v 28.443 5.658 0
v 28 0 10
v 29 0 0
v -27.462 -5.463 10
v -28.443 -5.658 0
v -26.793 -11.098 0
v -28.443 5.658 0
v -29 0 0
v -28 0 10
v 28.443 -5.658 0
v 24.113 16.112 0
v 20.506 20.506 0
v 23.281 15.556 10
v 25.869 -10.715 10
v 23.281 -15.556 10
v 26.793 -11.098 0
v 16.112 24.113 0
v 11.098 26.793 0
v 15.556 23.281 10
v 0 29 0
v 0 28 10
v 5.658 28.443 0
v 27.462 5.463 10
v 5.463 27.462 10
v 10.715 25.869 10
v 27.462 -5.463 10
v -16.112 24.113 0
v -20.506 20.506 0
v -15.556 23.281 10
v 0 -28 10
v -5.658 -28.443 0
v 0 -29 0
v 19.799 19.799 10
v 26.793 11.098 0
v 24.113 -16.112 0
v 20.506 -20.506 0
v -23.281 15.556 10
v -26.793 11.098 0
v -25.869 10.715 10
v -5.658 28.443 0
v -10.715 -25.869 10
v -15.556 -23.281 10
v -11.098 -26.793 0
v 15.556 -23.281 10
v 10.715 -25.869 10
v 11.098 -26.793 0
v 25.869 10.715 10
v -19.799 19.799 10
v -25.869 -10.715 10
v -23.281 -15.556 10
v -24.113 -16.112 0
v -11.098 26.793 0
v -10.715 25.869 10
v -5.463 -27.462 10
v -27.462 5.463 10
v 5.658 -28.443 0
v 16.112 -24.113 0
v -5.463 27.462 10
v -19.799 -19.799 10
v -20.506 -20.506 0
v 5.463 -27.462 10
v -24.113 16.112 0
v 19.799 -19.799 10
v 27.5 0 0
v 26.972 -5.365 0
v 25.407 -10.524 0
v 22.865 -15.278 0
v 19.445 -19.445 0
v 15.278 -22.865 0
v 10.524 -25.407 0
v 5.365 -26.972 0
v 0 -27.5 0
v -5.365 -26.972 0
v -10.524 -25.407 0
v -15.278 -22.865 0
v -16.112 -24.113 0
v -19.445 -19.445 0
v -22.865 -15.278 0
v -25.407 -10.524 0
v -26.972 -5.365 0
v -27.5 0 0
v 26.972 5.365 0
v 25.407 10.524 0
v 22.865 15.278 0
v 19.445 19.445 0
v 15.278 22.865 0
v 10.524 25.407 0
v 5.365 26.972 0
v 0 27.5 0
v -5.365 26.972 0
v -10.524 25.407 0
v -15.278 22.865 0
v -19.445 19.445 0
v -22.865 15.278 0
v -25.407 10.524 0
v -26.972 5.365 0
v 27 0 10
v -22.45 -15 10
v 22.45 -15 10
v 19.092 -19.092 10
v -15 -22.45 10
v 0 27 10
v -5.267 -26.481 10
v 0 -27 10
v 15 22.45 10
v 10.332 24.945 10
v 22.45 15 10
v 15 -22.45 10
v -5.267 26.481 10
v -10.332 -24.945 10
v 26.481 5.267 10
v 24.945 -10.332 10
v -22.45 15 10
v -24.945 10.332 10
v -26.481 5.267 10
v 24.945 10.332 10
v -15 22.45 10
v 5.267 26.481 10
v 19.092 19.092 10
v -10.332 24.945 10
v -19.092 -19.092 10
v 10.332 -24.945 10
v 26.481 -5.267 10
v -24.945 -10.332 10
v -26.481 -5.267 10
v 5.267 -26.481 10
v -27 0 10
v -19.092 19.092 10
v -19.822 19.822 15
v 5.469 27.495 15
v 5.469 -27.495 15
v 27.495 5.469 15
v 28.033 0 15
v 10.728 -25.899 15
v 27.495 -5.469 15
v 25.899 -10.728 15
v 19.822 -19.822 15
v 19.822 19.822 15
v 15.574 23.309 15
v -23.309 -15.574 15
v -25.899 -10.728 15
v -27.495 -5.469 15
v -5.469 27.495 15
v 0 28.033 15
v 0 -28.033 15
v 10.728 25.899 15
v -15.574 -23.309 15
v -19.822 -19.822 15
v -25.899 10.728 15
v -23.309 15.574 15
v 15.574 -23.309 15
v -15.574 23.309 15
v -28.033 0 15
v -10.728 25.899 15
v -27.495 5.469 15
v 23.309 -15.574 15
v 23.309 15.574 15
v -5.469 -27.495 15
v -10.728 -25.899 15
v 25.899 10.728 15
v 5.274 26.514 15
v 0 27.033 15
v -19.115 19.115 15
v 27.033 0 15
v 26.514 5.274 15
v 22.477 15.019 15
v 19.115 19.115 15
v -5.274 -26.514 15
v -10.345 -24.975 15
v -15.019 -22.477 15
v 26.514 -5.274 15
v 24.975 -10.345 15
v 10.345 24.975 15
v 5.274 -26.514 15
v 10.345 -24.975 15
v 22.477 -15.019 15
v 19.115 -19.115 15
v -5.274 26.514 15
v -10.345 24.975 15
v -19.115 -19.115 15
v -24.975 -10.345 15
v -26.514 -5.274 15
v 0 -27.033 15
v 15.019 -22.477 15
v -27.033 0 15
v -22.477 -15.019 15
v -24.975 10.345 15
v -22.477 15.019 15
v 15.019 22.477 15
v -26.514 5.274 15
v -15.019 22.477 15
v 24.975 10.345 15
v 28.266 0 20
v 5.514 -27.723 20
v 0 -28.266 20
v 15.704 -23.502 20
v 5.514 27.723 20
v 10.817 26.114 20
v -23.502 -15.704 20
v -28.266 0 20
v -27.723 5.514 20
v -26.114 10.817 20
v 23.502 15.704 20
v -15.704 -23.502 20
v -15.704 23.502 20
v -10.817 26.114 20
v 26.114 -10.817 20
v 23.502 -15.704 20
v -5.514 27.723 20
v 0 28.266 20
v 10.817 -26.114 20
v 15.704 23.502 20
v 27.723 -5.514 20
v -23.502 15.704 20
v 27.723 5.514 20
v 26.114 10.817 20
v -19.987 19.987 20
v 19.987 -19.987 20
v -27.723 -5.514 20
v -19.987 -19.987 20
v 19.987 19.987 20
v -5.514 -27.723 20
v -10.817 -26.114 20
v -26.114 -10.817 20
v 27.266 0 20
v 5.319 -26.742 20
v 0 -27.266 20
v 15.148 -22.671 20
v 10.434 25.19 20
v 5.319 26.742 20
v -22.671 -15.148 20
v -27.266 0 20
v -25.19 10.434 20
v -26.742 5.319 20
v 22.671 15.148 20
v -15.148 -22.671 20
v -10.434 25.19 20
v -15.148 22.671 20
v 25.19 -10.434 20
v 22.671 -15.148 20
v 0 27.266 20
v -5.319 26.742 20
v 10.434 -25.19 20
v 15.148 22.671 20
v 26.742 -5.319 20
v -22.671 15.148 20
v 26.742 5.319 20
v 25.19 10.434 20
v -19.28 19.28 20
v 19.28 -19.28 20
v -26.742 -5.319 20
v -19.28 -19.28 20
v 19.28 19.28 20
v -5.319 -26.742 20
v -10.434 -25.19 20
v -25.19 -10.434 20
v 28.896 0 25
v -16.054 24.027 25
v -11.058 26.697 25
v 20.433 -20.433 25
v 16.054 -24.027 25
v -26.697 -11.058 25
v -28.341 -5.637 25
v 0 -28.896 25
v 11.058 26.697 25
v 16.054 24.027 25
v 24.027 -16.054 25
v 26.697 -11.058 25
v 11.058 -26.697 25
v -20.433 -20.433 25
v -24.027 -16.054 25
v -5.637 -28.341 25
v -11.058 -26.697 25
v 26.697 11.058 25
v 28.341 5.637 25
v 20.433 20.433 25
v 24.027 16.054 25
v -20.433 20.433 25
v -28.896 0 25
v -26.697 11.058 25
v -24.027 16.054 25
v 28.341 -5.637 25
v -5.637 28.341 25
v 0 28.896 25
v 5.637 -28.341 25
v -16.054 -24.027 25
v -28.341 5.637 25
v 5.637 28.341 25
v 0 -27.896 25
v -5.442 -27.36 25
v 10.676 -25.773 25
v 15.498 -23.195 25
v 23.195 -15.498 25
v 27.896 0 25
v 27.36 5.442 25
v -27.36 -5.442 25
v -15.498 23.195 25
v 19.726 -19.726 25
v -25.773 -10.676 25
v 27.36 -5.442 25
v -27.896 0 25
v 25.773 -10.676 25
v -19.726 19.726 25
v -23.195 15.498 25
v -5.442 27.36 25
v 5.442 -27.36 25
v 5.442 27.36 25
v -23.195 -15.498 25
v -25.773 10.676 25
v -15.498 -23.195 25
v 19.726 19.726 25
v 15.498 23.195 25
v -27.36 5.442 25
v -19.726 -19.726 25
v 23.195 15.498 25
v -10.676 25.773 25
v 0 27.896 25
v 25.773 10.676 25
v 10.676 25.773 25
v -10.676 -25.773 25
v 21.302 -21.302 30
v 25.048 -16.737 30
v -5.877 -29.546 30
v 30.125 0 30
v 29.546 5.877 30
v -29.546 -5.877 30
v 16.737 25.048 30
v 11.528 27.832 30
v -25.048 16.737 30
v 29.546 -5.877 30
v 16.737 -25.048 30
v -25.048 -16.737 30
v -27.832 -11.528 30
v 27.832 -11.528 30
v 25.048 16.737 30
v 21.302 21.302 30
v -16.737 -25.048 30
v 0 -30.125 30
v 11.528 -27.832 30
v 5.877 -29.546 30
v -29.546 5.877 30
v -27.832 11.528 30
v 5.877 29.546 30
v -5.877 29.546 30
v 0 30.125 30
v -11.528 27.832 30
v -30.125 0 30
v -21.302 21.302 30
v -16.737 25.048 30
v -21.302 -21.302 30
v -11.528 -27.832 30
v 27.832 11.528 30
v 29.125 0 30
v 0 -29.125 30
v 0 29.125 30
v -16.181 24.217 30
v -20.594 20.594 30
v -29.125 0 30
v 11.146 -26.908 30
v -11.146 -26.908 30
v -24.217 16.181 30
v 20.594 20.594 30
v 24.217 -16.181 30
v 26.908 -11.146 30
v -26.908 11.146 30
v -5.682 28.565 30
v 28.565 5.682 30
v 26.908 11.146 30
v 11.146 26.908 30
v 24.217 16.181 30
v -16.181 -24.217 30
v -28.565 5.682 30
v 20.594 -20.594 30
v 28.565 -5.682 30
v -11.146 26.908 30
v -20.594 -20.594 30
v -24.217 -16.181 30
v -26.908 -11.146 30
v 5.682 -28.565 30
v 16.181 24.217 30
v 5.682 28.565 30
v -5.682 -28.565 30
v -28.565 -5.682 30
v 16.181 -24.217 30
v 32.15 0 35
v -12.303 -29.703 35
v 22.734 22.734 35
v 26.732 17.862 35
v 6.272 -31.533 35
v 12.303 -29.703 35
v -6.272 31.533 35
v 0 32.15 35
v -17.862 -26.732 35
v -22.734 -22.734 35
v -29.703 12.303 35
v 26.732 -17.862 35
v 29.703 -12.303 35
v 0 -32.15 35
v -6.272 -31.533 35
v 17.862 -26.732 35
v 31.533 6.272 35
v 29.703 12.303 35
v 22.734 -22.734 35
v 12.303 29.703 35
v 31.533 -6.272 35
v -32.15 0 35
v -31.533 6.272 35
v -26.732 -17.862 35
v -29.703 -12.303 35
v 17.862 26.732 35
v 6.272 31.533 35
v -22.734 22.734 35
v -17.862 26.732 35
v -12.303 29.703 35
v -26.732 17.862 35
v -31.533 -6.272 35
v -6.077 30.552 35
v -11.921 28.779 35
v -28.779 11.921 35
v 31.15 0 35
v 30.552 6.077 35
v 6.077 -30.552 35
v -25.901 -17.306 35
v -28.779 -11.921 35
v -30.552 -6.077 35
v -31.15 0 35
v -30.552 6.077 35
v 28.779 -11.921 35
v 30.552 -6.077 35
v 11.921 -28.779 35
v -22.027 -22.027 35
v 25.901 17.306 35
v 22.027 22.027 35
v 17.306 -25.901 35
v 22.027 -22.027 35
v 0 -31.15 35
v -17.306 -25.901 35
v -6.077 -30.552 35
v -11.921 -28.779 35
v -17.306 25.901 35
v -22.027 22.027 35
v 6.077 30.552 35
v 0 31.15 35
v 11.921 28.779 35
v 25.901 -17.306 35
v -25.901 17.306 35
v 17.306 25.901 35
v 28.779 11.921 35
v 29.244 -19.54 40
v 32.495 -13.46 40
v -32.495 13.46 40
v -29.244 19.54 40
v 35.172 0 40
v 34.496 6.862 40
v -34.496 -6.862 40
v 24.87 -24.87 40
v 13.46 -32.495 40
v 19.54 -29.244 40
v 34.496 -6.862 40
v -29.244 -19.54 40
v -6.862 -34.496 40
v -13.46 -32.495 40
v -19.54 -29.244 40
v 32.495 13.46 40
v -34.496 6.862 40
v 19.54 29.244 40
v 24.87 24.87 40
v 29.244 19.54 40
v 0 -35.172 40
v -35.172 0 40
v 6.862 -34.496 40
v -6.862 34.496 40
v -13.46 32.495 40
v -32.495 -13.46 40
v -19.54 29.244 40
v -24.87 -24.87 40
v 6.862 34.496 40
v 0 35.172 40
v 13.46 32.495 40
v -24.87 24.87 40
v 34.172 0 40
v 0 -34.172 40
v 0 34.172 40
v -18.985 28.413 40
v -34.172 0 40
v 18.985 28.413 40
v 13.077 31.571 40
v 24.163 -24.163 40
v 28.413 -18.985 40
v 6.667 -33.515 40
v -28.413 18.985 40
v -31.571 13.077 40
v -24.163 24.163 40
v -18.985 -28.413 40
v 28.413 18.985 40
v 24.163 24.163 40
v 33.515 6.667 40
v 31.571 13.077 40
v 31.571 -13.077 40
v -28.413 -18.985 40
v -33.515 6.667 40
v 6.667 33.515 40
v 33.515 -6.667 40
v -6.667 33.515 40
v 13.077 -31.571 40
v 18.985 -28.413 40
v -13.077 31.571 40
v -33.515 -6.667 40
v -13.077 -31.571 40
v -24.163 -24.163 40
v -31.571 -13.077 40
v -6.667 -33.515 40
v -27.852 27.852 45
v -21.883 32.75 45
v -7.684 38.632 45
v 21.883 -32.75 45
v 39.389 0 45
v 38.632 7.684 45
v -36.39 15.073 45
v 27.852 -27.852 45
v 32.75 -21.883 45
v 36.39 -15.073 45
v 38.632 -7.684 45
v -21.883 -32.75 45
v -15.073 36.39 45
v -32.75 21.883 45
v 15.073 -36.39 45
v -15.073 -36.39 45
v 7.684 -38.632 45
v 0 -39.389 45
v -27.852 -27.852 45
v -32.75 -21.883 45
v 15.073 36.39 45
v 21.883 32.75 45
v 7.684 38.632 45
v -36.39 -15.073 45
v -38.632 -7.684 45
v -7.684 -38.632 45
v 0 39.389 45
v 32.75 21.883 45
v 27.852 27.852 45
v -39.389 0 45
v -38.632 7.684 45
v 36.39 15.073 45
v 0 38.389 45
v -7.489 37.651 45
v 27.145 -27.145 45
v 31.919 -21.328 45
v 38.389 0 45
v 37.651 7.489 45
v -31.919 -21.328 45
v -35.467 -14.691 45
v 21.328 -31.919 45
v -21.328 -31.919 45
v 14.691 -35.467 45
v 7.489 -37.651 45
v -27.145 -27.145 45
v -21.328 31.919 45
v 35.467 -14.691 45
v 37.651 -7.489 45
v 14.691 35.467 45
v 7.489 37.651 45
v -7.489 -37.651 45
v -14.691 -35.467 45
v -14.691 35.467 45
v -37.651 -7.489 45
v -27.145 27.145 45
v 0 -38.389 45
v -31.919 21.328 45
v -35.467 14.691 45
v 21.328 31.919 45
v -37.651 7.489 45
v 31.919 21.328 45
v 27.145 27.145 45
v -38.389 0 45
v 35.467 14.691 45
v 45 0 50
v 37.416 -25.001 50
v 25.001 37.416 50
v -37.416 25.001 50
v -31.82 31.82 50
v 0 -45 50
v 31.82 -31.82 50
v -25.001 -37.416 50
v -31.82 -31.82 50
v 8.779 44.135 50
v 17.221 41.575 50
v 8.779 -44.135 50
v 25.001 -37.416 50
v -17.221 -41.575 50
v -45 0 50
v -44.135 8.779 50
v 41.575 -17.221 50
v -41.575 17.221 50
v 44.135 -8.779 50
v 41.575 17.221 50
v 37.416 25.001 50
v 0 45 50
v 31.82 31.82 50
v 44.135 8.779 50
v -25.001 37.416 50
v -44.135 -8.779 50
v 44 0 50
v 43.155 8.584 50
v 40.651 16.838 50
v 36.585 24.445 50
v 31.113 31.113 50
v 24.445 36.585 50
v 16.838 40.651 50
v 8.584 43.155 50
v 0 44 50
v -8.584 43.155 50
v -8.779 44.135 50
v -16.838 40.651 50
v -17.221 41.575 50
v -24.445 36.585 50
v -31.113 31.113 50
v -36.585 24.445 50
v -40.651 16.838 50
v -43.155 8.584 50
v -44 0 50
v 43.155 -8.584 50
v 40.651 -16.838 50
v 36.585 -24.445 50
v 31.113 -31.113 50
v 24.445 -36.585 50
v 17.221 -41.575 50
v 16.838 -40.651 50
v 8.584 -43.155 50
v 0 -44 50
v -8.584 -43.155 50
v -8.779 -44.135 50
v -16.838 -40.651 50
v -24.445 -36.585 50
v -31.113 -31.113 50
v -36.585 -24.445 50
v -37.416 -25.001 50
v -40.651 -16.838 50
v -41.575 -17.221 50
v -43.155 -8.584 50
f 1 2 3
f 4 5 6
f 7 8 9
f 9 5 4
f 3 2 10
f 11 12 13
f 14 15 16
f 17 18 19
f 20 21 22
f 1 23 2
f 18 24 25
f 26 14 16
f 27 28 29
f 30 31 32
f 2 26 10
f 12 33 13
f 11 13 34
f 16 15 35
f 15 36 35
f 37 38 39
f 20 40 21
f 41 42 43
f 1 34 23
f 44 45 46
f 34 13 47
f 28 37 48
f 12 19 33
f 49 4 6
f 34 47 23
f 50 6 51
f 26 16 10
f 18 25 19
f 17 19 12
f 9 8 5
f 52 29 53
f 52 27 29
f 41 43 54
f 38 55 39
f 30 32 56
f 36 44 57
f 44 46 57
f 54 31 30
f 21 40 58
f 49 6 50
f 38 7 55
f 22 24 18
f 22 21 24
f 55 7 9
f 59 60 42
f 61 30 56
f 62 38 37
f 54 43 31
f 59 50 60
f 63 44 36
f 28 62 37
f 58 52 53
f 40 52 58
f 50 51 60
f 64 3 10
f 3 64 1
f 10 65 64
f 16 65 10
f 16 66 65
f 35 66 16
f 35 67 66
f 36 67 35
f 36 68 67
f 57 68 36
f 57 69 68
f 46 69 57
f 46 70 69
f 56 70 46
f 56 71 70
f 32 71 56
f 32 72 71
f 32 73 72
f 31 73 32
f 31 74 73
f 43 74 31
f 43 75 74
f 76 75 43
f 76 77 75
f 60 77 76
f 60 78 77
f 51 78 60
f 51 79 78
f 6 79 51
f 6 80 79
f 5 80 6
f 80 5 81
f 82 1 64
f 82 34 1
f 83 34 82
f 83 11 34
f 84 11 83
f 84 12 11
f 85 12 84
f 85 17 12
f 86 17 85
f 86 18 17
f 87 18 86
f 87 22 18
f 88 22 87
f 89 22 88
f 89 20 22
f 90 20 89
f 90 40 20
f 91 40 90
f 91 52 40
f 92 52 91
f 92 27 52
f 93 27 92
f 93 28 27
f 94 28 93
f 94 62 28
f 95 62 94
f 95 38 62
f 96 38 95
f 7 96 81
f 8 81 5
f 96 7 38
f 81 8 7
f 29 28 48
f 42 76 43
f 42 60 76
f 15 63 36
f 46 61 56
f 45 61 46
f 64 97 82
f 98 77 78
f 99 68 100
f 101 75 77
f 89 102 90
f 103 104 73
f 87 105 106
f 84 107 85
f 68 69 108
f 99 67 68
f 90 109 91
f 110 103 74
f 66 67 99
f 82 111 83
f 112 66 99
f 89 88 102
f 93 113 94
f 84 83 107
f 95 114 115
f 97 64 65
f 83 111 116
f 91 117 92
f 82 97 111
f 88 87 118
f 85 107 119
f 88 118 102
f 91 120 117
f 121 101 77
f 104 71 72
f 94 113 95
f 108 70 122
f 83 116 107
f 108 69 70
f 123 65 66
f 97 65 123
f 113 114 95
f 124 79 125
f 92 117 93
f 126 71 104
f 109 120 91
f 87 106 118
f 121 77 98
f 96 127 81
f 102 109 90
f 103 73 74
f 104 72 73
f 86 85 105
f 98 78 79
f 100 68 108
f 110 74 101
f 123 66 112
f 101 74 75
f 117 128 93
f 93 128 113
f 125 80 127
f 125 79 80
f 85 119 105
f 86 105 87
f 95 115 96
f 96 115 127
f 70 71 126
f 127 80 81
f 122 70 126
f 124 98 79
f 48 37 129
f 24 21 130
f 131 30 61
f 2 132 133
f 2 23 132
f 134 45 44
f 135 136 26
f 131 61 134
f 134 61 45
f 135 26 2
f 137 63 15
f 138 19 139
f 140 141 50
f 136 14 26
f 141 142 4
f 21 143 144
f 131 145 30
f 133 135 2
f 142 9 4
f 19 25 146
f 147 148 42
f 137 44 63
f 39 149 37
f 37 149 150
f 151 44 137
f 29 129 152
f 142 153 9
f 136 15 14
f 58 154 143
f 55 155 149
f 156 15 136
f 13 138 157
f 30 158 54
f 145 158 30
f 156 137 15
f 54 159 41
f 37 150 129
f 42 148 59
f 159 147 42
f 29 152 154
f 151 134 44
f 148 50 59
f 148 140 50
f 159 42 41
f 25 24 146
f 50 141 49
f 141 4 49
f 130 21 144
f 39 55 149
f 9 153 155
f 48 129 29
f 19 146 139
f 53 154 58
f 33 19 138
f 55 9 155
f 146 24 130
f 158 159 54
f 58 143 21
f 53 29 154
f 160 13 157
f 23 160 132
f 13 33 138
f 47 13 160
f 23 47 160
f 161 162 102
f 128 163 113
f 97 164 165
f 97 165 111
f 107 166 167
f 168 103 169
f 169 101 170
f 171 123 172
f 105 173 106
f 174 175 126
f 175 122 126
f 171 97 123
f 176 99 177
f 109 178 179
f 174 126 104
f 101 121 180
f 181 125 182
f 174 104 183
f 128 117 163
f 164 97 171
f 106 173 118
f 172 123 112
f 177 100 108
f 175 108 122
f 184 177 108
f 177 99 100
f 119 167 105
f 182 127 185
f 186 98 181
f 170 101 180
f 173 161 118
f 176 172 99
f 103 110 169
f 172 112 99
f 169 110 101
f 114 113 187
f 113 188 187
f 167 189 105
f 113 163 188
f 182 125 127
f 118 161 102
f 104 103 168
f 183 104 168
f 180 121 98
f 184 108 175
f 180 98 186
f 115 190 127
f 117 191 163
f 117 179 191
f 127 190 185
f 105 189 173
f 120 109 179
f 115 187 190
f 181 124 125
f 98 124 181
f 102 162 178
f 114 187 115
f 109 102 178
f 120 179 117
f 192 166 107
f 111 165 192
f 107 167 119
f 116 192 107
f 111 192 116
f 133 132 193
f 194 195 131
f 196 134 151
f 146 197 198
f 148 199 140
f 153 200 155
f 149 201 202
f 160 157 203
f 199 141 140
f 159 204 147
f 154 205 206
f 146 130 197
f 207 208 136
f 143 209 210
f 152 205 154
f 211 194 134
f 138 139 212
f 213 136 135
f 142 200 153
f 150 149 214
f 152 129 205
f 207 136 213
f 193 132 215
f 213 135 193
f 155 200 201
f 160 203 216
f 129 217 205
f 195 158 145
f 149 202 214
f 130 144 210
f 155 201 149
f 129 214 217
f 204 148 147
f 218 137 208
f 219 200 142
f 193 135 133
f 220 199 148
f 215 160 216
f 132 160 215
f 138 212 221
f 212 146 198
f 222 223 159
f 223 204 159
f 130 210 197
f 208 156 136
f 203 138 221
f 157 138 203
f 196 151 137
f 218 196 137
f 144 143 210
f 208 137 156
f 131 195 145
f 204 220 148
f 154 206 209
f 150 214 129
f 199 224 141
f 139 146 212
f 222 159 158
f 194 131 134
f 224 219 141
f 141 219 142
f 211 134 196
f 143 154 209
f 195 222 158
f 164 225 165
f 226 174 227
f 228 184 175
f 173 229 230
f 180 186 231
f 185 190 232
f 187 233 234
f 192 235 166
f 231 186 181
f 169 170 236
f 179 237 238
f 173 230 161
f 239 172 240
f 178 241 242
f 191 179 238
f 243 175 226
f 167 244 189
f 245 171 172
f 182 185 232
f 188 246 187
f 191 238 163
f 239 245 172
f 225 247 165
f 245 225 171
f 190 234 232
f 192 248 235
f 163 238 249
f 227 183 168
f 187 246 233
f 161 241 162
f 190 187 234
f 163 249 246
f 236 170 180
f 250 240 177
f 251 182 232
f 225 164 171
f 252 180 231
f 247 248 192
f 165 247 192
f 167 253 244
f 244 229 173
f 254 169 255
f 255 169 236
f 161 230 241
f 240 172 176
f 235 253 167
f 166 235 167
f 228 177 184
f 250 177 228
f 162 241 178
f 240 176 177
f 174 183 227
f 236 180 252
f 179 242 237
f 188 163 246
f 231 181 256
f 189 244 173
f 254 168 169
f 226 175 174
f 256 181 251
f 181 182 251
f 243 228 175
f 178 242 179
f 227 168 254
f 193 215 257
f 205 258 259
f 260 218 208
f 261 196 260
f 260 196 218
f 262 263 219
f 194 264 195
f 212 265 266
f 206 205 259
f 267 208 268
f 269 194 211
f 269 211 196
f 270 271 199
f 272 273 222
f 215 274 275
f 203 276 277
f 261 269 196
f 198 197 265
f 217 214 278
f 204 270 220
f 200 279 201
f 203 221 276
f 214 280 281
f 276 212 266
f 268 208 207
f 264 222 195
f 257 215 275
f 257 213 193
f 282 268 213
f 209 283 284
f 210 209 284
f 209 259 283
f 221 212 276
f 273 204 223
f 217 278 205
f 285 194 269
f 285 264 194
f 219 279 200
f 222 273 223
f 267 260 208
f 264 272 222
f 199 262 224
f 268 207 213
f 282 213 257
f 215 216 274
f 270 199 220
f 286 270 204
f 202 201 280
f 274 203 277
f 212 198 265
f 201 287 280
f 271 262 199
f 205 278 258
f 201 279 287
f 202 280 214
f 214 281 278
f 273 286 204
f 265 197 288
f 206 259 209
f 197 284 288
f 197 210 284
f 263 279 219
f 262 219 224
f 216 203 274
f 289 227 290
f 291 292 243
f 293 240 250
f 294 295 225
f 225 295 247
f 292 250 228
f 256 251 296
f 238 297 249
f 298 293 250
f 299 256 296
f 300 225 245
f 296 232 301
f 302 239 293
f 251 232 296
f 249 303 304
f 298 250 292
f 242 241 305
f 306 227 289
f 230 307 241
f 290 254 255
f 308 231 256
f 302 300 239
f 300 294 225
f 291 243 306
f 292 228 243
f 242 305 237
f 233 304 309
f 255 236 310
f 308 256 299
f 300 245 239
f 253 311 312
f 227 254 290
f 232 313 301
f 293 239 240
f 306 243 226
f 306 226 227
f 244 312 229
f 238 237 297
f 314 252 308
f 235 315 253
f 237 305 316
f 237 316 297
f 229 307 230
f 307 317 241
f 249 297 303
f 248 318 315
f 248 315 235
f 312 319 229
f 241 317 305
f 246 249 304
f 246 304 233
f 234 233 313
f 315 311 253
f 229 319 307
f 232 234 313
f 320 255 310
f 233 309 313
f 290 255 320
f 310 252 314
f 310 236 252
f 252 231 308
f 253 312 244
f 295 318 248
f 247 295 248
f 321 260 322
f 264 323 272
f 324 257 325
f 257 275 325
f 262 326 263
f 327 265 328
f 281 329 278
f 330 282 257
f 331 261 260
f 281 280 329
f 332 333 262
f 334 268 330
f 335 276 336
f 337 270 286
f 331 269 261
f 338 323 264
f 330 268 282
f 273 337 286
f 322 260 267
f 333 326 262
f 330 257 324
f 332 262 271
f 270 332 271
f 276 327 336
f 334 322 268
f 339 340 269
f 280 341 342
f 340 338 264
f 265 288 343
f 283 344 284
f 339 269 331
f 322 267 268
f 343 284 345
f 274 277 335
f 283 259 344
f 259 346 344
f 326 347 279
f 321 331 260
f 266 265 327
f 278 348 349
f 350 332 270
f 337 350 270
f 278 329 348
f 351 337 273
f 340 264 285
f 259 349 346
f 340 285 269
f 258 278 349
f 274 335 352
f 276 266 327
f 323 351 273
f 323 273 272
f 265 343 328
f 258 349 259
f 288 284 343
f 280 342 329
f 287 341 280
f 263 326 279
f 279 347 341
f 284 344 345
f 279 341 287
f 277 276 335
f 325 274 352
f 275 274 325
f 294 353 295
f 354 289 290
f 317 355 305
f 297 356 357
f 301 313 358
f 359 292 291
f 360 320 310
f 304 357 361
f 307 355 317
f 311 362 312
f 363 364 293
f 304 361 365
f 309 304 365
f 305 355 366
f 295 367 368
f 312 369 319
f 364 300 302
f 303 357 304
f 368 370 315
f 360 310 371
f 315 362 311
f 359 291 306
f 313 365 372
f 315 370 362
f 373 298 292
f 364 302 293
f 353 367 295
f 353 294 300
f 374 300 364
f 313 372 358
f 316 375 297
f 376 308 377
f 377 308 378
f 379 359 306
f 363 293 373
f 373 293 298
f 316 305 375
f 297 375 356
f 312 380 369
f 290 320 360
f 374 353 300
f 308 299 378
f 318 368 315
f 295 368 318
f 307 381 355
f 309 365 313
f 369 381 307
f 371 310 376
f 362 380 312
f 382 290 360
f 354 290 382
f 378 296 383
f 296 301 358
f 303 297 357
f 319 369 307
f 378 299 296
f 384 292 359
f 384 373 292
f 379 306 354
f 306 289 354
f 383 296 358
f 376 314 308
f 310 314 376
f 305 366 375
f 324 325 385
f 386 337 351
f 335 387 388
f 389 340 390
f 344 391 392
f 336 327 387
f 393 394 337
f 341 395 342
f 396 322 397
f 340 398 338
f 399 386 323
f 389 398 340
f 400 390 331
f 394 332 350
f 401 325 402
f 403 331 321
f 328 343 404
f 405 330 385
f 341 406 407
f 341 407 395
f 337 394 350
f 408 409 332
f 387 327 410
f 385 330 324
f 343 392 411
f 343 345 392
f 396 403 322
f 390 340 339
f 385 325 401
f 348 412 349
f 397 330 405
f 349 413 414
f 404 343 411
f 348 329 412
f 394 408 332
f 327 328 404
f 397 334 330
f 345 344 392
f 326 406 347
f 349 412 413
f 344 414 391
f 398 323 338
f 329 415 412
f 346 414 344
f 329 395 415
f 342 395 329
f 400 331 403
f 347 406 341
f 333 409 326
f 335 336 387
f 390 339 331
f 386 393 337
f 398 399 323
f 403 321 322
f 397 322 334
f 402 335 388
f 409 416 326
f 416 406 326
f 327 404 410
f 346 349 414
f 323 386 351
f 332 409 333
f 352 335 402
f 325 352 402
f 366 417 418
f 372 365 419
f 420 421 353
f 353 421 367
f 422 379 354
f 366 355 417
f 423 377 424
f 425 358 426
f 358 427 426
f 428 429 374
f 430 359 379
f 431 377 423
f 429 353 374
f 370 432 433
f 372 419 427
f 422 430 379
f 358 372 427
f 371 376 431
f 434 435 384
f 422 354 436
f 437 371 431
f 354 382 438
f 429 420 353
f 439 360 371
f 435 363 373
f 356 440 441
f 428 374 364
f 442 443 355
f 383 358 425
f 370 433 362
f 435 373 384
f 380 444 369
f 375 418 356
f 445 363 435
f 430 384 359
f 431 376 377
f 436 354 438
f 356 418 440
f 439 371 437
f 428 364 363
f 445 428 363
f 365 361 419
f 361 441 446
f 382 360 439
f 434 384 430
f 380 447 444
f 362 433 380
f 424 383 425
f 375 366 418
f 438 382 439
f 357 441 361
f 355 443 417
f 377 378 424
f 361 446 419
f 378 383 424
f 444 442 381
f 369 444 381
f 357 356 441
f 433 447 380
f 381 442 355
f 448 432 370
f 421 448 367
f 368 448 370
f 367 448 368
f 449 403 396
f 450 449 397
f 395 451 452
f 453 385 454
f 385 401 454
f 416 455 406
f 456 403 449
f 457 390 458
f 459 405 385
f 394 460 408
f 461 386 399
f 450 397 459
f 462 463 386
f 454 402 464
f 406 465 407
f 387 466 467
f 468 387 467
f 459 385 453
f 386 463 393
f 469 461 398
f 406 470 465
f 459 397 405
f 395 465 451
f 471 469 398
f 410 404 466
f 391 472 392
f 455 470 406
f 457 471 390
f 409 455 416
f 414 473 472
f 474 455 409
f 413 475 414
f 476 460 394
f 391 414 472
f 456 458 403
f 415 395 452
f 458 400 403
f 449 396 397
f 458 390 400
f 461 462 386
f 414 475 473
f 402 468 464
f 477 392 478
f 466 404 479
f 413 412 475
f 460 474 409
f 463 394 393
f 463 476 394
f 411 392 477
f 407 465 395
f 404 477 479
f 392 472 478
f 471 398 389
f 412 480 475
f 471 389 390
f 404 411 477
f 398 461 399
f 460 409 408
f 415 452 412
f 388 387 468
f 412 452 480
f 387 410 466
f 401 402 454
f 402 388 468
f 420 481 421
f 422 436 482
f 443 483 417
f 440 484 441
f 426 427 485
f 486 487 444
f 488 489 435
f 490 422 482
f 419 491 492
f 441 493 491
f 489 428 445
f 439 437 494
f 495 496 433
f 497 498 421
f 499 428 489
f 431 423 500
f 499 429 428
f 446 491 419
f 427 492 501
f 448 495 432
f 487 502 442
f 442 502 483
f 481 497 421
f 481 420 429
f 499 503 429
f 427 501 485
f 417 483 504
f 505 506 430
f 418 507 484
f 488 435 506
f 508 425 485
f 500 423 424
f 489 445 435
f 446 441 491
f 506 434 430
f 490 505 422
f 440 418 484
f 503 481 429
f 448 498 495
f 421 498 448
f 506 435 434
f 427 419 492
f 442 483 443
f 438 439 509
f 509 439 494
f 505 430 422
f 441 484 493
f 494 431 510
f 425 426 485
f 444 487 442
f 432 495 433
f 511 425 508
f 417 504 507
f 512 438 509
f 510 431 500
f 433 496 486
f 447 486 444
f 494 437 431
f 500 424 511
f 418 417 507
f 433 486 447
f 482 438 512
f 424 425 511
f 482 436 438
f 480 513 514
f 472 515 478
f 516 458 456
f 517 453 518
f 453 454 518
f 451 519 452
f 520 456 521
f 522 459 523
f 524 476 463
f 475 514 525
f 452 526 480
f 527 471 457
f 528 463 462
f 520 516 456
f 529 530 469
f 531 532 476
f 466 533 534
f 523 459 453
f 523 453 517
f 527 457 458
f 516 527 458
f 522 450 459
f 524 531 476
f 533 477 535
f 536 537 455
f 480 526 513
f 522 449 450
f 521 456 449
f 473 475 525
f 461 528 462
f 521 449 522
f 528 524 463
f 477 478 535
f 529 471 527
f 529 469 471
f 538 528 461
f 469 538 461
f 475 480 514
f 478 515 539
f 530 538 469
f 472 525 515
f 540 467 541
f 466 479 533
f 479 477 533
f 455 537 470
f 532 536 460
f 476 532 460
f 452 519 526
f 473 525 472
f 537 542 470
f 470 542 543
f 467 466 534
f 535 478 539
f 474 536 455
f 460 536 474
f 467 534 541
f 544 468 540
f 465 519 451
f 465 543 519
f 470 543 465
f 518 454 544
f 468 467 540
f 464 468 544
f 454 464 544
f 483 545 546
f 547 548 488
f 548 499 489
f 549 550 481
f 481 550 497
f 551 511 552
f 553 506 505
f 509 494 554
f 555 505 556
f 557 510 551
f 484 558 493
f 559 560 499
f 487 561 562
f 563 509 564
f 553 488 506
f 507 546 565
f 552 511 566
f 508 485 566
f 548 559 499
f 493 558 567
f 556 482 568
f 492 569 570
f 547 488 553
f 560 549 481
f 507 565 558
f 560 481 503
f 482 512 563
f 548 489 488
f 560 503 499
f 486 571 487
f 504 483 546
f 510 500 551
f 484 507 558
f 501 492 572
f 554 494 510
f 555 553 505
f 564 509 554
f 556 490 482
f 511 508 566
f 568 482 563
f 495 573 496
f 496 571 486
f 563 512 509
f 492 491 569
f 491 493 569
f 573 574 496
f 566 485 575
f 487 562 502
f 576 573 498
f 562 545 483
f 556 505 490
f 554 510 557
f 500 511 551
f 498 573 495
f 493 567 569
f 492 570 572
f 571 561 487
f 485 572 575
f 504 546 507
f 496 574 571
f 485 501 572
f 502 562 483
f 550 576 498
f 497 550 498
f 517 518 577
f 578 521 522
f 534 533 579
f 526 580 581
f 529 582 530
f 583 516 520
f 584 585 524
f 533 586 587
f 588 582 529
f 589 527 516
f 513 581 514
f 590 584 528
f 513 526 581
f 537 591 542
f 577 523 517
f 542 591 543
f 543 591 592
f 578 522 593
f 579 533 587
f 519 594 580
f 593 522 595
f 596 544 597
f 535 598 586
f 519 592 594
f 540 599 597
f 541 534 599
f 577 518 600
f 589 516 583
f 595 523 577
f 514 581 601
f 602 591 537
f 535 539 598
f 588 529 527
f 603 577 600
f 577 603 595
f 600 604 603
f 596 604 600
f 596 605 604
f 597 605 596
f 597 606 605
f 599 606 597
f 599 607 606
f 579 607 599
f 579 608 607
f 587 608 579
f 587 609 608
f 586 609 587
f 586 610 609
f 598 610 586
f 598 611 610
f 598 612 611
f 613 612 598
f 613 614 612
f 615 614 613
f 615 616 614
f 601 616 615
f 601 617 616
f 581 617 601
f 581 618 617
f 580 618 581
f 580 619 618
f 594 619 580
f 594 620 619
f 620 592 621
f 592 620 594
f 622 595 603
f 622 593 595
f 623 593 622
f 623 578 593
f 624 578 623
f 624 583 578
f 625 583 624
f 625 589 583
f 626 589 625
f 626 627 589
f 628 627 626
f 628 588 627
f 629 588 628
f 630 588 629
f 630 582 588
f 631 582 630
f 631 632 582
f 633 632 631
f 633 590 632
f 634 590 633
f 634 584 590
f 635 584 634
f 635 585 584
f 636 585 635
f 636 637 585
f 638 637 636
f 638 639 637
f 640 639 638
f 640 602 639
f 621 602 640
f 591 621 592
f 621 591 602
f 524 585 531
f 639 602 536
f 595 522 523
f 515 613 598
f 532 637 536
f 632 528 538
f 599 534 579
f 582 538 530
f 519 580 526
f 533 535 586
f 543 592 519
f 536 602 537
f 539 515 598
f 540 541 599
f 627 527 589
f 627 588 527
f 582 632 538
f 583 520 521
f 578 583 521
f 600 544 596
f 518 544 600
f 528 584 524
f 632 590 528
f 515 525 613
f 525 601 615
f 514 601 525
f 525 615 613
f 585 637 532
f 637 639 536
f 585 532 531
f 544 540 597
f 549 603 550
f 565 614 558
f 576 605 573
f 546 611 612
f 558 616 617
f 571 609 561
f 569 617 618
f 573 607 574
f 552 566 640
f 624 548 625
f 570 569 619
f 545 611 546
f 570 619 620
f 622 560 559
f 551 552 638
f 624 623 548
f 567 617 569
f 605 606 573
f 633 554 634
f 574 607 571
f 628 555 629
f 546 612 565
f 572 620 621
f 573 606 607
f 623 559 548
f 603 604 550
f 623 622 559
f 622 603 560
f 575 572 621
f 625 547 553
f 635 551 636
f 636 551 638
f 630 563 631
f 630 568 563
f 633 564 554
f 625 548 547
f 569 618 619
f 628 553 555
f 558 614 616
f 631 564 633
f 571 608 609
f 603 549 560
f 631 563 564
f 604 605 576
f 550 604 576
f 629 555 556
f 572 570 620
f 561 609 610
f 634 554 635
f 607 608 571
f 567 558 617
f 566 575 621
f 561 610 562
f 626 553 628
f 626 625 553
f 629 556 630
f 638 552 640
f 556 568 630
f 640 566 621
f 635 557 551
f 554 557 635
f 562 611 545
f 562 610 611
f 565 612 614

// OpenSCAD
// file: basic.scad
/**
 * A basic Velocity stack module
 * @param od Outer diameter 
 * @param id Inner diameter (bore)
 * @param h Overall height of the stack
 * @param bell Diameter of bell
 * @param f flare factor (positive integer) defines the harshness of the curve
 */
module basic_vstack(od, id, h, bell, f=3, $fn=32)
{

	heightDivisions = $fn / 4;
	deltaHeight = h / heightDivisions;
	deltaR = (bell - od)/2;
	radius = od/2;
	innerRadius = id/2;

	for ( i = [0 : (heightDivisions - 1)]) {
		translate([0,0,i*deltaHeight]) difference() {
			cylinder(
					r1 = vstack_radius(i/heightDivisions,f)*deltaR+radius, 
					r2=vstack_radius((i+1)/heightDivisions,f)*deltaR+radius,
					h = deltaHeight,
					$fn = $fn
				);
			cylinder(
					r1 = vstack_radius(i/heightDivisions,f)*deltaR+innerRadius,
					r2 = vstack_radius((i+1)/heightDivisions,f)*deltaR+innerRadius,
					h = deltaHeight,
					$fn = $fn
				);
		}
	}
}

/**
 * produces the profile radius (from 0 to 1) for some given height (also from 0 to 1)
 * @param x distance along profile (height)
 */
function vstack_radius(x,f) = (pow(x,f));
// main file
include <basic.scad>;

carbOuterDiameter = 54; // Outer diameter of the carb lip
carbDepth = 10; // Depth of the lip around the carb

stackBellDiameter = 90; // Diameter of the bell
stackHeight = 40; // Height of the stack (not including carb)

fragments = 48; // Determines overall quality of mesh

difference() {
	cylinder(r1 = (carbOuterDiameter+4)/2, r2 = (carbOuterDiameter+2)/2, h = carbDepth, $fn=32);
	cylinder(r1 = (carbOuterDiameter+1)/2, r2 = (carbOuterDiameter)/2, h = carbDepth, $fn=32);
}

translate([0,0,carbDepth])
	basic_vstack(carbOuterDiameter+2, carbOuterDiameter, stackHeight, stackBellDiameter, $fn=32);
